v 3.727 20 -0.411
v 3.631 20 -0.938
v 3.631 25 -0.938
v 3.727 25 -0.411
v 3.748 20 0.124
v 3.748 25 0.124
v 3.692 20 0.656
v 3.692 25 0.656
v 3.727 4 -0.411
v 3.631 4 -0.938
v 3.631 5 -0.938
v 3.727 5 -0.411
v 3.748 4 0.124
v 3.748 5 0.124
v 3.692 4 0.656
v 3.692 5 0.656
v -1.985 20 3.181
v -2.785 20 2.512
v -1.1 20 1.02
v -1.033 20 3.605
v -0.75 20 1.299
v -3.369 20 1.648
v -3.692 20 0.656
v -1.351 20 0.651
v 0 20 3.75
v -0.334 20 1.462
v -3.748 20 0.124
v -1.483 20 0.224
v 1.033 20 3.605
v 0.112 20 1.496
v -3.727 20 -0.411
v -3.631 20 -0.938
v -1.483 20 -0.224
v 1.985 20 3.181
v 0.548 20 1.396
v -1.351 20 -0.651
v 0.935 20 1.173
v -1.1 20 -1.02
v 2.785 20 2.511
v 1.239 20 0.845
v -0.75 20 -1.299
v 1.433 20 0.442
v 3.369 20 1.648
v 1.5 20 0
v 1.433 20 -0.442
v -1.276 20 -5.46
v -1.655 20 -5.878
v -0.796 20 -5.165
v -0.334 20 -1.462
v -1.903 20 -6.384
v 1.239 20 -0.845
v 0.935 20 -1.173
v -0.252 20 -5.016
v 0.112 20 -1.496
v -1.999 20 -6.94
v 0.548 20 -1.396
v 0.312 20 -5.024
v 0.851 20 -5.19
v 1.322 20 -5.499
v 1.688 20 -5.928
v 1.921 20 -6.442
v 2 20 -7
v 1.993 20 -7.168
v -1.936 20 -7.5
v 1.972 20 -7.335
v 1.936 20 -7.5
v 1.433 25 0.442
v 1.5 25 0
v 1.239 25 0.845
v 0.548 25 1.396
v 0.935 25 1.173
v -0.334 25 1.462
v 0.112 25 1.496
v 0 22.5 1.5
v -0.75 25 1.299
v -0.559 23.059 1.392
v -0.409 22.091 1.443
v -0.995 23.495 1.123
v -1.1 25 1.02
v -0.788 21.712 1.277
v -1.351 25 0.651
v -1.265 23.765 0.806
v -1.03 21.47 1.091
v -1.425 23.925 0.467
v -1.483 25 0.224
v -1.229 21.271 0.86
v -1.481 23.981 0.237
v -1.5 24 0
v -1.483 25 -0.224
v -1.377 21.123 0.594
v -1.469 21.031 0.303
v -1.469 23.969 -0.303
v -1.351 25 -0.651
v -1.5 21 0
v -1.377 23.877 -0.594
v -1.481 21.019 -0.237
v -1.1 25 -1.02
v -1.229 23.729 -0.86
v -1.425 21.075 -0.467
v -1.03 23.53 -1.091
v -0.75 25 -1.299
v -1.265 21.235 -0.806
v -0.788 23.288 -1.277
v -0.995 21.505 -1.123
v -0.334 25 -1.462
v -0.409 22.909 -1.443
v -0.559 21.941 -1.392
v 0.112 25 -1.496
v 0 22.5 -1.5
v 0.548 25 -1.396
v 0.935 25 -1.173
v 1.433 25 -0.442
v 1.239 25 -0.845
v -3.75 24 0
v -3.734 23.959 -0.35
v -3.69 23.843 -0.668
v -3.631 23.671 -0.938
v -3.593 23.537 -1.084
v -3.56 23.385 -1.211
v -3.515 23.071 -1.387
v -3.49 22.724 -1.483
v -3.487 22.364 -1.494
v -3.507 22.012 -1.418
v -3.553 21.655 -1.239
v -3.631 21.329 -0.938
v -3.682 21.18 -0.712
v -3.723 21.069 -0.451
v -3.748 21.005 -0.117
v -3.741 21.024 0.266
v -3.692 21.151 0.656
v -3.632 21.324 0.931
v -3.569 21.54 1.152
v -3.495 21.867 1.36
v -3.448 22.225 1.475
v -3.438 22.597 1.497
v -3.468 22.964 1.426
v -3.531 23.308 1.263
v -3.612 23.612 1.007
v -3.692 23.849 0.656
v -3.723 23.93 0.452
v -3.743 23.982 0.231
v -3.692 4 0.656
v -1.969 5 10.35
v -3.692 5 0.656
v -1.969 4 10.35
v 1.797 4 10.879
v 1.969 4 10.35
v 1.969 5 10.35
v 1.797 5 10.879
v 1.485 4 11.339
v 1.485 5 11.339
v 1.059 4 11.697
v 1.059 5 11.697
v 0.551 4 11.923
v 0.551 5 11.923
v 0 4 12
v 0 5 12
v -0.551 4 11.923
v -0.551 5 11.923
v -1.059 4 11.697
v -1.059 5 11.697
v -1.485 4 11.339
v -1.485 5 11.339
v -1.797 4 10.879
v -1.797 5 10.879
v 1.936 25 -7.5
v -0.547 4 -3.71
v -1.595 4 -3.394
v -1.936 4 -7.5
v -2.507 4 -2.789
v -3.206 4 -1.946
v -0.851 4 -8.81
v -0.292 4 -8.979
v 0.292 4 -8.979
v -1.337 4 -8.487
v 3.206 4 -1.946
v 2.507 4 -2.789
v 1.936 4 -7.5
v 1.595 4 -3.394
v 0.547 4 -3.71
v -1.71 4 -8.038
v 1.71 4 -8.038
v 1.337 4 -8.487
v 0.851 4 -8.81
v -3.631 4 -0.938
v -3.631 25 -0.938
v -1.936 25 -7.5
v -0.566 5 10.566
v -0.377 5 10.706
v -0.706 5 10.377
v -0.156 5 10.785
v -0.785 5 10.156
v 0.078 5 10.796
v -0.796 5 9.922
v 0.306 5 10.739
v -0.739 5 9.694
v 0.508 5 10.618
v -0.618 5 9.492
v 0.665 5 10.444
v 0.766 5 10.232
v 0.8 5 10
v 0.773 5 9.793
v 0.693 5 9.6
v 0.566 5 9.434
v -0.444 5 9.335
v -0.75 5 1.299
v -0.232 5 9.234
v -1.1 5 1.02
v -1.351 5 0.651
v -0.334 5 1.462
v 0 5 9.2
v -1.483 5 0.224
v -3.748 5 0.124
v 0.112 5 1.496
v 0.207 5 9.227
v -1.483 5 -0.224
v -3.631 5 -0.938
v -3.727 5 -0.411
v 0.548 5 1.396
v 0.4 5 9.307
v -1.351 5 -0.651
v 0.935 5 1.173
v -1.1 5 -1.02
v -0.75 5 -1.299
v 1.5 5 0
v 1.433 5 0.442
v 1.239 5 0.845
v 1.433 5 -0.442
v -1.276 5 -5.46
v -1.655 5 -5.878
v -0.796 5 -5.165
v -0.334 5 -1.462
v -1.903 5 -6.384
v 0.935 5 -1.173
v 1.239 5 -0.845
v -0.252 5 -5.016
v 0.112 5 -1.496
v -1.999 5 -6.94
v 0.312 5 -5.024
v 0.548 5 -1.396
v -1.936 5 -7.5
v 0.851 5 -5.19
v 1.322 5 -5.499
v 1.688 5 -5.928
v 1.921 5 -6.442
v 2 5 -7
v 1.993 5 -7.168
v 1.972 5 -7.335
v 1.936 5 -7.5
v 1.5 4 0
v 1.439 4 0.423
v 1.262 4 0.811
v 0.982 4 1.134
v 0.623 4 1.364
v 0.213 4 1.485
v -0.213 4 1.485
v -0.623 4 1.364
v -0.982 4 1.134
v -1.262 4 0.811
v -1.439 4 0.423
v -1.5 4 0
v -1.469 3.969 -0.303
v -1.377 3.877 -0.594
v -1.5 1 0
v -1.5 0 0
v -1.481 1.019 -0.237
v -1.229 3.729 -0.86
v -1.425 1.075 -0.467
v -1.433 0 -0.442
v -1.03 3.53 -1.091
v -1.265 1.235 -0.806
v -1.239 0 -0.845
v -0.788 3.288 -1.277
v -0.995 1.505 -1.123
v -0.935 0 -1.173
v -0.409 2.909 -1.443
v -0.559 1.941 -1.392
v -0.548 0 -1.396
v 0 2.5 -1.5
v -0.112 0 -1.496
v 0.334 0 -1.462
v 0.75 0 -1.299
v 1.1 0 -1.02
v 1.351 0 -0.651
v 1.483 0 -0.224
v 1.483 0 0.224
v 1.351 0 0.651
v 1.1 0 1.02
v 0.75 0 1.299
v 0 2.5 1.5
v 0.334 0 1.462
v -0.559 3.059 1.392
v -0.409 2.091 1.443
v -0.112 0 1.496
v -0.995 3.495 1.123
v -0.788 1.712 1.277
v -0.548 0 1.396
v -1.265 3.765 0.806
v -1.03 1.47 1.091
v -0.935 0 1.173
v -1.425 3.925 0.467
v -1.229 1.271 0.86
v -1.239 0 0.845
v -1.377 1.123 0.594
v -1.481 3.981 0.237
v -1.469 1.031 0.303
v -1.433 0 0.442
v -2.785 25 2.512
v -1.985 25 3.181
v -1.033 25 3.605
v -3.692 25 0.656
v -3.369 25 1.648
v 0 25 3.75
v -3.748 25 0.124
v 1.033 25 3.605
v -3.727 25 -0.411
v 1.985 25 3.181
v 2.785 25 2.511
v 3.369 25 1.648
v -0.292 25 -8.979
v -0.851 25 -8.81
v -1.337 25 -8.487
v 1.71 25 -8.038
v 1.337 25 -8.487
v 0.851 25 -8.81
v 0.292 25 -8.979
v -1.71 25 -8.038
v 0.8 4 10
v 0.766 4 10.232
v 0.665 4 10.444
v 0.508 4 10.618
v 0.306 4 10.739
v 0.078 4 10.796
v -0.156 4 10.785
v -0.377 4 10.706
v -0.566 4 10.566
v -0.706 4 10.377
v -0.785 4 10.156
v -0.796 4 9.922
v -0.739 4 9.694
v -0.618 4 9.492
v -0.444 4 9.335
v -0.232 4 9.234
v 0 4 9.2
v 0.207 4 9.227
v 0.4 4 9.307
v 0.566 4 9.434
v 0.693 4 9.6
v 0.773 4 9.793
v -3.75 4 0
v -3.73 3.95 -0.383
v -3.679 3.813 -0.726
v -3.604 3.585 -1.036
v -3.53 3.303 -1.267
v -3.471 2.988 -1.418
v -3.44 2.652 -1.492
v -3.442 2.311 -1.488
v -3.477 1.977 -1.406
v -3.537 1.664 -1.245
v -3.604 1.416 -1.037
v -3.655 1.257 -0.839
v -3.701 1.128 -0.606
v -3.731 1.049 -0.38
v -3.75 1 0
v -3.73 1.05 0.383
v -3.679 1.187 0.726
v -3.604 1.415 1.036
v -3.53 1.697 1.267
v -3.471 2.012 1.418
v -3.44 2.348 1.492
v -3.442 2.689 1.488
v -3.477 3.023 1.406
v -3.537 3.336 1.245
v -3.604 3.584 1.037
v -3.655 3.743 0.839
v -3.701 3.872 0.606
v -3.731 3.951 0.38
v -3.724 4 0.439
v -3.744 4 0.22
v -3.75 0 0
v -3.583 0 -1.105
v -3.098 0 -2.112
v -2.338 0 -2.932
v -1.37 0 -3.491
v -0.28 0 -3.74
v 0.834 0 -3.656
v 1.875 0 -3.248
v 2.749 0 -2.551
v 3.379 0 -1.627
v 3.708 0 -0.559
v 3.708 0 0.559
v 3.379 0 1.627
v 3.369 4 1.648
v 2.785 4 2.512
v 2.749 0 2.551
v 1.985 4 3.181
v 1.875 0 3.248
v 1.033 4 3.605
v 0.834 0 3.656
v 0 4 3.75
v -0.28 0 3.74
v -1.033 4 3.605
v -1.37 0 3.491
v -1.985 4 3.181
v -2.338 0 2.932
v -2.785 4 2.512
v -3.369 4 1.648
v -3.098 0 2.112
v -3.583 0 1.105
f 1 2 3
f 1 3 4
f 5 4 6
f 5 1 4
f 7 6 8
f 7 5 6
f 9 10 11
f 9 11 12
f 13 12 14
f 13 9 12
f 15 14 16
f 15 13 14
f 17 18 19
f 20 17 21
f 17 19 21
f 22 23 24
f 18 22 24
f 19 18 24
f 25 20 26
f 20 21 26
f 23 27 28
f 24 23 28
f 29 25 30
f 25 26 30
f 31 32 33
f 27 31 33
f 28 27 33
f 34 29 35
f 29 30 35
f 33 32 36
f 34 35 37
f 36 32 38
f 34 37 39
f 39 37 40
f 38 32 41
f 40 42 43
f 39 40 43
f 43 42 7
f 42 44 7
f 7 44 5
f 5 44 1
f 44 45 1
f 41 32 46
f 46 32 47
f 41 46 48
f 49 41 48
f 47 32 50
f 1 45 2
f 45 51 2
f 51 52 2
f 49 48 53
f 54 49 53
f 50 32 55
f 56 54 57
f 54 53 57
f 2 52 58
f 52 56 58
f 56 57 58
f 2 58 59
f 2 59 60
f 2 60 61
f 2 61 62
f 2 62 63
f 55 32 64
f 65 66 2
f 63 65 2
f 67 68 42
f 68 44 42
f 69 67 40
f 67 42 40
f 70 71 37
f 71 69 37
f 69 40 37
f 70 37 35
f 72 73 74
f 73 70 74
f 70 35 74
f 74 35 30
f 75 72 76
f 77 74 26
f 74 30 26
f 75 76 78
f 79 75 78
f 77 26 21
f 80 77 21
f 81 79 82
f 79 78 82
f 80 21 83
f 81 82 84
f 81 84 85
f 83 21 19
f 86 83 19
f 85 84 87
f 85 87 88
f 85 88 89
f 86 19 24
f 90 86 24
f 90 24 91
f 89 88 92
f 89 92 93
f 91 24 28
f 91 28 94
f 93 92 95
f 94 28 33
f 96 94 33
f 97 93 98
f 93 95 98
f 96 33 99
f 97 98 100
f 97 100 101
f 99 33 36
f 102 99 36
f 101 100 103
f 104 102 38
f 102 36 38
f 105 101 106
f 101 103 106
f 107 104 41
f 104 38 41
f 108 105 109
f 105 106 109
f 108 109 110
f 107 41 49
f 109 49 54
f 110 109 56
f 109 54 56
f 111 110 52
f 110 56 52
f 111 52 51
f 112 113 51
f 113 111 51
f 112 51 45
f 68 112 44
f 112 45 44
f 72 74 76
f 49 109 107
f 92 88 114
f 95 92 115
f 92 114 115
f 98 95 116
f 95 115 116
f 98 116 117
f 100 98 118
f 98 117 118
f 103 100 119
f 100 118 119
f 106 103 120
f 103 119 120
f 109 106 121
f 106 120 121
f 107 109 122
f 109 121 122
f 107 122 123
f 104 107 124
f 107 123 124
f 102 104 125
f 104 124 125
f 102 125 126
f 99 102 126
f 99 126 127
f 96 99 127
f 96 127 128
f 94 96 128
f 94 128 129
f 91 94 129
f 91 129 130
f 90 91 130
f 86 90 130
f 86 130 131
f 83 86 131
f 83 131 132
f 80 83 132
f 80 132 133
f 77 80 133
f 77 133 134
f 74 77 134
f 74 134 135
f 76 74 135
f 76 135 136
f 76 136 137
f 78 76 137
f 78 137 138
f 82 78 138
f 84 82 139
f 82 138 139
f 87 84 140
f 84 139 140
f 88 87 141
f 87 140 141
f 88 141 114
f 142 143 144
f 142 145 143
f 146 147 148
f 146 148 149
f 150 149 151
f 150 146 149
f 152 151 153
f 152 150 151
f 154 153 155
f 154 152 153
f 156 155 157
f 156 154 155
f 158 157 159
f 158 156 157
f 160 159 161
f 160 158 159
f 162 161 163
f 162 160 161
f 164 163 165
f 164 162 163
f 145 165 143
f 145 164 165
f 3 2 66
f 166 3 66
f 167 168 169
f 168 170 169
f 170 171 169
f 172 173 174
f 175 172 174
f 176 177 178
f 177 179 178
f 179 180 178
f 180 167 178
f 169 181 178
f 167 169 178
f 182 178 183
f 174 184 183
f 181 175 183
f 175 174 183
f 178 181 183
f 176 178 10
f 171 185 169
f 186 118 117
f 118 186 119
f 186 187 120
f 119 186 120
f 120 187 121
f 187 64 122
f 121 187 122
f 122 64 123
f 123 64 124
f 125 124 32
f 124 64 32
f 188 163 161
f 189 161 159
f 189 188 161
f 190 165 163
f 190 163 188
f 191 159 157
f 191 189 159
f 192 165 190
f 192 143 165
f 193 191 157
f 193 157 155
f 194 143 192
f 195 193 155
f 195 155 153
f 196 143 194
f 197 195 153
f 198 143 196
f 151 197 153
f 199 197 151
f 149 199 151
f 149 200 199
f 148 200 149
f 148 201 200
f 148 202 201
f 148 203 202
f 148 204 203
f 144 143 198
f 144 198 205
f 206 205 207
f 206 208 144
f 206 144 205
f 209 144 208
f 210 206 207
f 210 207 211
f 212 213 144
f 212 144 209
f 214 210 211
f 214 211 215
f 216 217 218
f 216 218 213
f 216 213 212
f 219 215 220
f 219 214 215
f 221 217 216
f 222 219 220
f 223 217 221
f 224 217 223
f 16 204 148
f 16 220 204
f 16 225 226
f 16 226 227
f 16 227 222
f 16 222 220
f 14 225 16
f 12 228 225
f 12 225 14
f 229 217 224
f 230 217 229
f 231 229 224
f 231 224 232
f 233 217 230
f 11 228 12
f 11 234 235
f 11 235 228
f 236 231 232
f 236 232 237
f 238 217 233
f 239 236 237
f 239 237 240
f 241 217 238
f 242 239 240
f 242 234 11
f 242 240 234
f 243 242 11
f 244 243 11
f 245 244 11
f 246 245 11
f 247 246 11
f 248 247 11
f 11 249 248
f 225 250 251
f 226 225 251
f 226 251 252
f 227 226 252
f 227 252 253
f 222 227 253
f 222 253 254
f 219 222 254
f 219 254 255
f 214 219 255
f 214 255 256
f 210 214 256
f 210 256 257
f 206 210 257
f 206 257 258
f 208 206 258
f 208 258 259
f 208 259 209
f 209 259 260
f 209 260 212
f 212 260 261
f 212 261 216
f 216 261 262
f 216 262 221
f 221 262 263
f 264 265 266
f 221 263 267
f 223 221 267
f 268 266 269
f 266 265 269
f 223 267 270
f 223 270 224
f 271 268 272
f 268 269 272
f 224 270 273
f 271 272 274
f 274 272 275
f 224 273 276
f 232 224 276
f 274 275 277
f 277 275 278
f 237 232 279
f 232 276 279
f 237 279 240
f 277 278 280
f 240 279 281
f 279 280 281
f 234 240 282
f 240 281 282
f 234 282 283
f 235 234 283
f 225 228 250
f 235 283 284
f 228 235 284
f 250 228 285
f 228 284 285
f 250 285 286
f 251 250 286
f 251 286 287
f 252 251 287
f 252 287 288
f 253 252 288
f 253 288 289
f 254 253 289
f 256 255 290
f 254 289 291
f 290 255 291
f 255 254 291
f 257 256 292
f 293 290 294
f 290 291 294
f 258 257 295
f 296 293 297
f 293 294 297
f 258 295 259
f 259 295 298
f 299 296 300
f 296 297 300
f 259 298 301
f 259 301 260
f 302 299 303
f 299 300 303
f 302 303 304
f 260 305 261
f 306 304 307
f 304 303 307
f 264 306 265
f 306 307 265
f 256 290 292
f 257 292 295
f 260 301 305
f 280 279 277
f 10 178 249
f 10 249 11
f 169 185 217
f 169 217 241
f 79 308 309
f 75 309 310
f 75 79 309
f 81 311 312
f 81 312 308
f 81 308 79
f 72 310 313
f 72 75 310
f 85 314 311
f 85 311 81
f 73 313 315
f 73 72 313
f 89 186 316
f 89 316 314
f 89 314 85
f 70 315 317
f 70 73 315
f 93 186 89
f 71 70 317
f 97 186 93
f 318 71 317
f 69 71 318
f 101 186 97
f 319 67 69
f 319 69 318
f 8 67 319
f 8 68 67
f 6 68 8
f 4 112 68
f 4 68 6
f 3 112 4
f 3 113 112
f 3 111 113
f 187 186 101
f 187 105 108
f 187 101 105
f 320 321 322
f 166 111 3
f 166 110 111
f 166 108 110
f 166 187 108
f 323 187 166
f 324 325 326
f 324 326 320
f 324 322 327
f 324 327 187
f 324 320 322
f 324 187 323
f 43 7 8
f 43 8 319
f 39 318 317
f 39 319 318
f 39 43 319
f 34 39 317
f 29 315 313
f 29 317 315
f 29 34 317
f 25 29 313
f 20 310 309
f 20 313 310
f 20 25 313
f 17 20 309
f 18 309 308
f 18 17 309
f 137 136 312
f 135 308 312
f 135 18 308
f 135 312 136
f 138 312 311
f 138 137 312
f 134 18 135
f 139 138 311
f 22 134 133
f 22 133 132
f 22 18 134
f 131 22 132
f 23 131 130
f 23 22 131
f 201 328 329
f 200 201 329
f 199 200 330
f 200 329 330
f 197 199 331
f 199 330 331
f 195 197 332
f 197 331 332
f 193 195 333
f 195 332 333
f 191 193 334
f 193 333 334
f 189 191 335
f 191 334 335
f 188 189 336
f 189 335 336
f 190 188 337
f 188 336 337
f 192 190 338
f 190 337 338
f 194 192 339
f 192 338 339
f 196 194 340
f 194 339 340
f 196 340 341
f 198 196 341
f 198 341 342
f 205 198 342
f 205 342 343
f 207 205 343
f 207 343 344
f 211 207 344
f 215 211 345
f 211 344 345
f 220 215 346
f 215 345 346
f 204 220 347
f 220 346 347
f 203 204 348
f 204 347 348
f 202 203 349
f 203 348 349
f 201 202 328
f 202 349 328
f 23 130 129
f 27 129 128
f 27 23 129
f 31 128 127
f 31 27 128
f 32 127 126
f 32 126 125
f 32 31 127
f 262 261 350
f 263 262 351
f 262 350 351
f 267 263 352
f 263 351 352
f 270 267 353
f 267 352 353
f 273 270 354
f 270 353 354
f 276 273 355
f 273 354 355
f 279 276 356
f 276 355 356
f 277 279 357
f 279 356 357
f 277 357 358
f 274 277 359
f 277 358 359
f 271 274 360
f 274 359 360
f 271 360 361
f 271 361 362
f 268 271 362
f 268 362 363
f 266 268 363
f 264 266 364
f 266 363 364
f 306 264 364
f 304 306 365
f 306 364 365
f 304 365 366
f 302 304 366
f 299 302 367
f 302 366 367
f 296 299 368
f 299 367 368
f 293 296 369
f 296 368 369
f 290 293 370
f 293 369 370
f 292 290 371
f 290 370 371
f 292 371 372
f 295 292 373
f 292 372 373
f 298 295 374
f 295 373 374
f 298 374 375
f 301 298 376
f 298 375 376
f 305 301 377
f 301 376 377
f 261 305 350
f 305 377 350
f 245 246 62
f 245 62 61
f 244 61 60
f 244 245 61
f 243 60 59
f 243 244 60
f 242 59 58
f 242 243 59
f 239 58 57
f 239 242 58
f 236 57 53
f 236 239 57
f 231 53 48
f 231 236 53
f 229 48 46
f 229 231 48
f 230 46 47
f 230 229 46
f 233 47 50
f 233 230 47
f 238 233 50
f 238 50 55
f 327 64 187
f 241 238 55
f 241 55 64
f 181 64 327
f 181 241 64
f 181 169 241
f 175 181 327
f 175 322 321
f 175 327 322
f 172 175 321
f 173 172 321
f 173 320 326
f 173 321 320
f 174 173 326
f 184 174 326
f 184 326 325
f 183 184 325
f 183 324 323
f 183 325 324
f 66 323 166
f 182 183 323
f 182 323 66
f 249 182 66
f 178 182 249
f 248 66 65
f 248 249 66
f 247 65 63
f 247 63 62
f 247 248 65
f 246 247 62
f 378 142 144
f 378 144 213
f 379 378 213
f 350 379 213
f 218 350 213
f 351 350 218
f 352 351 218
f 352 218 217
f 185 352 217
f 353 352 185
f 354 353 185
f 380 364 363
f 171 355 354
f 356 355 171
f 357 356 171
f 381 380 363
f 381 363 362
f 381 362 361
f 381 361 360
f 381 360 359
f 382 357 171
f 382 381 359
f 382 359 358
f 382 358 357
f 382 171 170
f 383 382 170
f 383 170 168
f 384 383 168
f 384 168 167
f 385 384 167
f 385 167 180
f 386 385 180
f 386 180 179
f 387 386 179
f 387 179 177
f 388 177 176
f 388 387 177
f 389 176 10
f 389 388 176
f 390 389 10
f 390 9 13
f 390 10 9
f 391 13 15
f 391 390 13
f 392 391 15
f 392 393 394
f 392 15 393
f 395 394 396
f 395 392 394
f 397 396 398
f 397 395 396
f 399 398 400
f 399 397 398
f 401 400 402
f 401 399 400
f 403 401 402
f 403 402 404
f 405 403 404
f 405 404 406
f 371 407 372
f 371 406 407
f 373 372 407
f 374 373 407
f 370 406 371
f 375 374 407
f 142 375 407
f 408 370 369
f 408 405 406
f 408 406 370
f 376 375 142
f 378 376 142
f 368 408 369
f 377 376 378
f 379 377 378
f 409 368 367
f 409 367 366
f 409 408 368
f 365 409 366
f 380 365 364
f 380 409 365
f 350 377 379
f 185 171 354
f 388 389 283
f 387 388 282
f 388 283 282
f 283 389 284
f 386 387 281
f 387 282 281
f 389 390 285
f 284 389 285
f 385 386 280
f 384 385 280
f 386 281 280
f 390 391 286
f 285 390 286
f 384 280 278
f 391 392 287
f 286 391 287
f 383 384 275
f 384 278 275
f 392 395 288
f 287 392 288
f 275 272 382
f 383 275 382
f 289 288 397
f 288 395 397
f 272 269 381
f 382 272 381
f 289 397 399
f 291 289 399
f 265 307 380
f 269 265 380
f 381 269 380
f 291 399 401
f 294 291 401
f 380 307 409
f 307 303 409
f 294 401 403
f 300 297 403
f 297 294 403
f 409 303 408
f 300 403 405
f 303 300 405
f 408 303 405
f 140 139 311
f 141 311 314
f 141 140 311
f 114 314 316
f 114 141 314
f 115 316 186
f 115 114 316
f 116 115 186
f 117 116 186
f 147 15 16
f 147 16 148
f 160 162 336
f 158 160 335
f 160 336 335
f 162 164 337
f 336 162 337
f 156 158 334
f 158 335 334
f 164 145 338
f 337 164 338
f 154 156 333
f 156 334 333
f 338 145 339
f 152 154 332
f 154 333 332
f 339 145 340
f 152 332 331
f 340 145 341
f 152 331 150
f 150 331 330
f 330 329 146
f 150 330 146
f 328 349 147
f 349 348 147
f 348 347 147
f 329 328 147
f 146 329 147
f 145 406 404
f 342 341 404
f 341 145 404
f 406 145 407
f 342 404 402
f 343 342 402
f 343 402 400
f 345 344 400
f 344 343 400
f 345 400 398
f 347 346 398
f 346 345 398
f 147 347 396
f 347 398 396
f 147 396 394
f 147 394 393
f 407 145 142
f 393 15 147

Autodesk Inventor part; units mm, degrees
ref_plane "XZ Plane" through (0, 0, 0) normal (0, 1, 0) x (-1, 0, 0)
ref_plane "XY Plane" through (0, 0, 0) normal (0, 0, 1) x (1, 0, 0)
sketch "Sketch1" plane through (0, 0, 0) normal (0, 1, 0) x (-1, 0, 0)
  circle A0 centre (0, 0) radius 3.75
  circle A1 centre (0, 0) radius 1.5
  dimension "d0" = 7.5
  dimension "d1" = 3
extrude "Extrusion1" add sketch "Sketch1" along normal blind 4
sketch "Sketch2" plane through (0, 4, 0) normal (0, 1, 0) x (1, 0, 0)
  circle A0 centre (0, 0) radius 3.75 projected
  circle A1 centre (0, 0) radius 3.75 projected
  line L0 (0, 0) -> (0, 7)
  circle A2 centre (0, 7) radius 2
  line L1 (-3.6309, 0.9375) -> (-1.9365, 7.5)
  line L2 (1.9365, 7.5) -> (3.6309, 0.9375)
  circle A3 centre (0, 0) radius 1.5 projected
  line L3 (0, 0) -> (0, -10)
  circle A4 centre (0, -10) radius 0.8
  circle A5 centre (0, -10) radius 2
  line L4 (-1.9691, -10.35) -> (-3.6921, -0.6563)
  line L5 (3.6921, -0.6562) -> (1.9691, -10.35)
  dimension "d4" = 7
  dimension "d5" = 4
  dimension "d7" = 10
  dimension "d8" = 1.6
  dimension "d9" = 4
extrude "Extrusion2" add sketch "Sketch2" along normal blind 1 contours A0 L3 A3 L0 | A0 L0 A2 L2 | L5 A5 L3 A0 | L0 A3 L3 A0 | A0 L1 A2 L0 | A2 | L3 A5 L4 A0 | A5
extrude "Extrusion3" add sketch "Sketch2" along normal blind 16 contours A2
sketch "Sketch3" plane through (0, 20, -7) normal (0, 1, 0) x (1, 0, 0)
  arc A0 (-3.6921, -7.6563) -> (3.6921, -7.6562) centre (0, -7) ccw projected
  arc A1 (3.6309, -6.0625) -> (-3.6309, -6.0625) centre (0, -7) ccw projected
  arc A2 (-3.6309, -6.0625) -> (-3.6921, -7.6563) centre (0, -7) ccw projected
  arc A3 (3.6921, -7.6562) -> (3.6309, -6.0625) centre (0, -7) ccw projected
  circle A4 centre (0, -7) radius 1.5 projected
  line L0 (-1.9365, 0.5) -> (-3.6309, -6.0625) projected
  line L1 (3.6309, -6.0625) -> (1.9365, 0.5) projected
  circle A5 centre (0, 0) radius 2 projected
extrude "Extrusion4" add sketch "Sketch3" along normal blind 1
extrude "Extrusion5" add sketch "Sketch3" along normal blind 5
ref_plane "Work Plane1" through (-3.75, 20, 0) normal (1, 0, 0) x (0, 1, 0)
sketch "Sketch5" plane through (-3.75, 20, 0) normal (1, 0, 0) x (0, 1, 0)
  line L0 (5, 1.5) -> (5, -1.5) projected
  line L1 (0, -1.5) -> (0, 1.5) projected
  line L2 (-15, 1.5) -> (-15, -1.5) projected
  line L3 (-20, -1.5) -> (-20, 1.5) projected
  line L4 (0, 0) -> (5, 0)
  line L5 (-15, 0) -> (-20, 0)
  circle A0 centre (-17.5, 0) radius 1.5
  circle A1 centre (2.5, 0) radius 1.5
  dimension "d19" = 3
  dimension "d20" = 3
  dimension "d27" = 20
extrude "Extrusion6" cut sketch "Sketch5" along normal up to surface
thread "Thread1" size "M3x0.5" class "6H" standard "ANSI Metric M Profile" full length
thread "Thread2" size "M3x0.5" class "6H" standard "ANSI Metric M Profile" full length
properties part number "steeringYoke3mmShaft" material "Brass, Soft Yellow"
